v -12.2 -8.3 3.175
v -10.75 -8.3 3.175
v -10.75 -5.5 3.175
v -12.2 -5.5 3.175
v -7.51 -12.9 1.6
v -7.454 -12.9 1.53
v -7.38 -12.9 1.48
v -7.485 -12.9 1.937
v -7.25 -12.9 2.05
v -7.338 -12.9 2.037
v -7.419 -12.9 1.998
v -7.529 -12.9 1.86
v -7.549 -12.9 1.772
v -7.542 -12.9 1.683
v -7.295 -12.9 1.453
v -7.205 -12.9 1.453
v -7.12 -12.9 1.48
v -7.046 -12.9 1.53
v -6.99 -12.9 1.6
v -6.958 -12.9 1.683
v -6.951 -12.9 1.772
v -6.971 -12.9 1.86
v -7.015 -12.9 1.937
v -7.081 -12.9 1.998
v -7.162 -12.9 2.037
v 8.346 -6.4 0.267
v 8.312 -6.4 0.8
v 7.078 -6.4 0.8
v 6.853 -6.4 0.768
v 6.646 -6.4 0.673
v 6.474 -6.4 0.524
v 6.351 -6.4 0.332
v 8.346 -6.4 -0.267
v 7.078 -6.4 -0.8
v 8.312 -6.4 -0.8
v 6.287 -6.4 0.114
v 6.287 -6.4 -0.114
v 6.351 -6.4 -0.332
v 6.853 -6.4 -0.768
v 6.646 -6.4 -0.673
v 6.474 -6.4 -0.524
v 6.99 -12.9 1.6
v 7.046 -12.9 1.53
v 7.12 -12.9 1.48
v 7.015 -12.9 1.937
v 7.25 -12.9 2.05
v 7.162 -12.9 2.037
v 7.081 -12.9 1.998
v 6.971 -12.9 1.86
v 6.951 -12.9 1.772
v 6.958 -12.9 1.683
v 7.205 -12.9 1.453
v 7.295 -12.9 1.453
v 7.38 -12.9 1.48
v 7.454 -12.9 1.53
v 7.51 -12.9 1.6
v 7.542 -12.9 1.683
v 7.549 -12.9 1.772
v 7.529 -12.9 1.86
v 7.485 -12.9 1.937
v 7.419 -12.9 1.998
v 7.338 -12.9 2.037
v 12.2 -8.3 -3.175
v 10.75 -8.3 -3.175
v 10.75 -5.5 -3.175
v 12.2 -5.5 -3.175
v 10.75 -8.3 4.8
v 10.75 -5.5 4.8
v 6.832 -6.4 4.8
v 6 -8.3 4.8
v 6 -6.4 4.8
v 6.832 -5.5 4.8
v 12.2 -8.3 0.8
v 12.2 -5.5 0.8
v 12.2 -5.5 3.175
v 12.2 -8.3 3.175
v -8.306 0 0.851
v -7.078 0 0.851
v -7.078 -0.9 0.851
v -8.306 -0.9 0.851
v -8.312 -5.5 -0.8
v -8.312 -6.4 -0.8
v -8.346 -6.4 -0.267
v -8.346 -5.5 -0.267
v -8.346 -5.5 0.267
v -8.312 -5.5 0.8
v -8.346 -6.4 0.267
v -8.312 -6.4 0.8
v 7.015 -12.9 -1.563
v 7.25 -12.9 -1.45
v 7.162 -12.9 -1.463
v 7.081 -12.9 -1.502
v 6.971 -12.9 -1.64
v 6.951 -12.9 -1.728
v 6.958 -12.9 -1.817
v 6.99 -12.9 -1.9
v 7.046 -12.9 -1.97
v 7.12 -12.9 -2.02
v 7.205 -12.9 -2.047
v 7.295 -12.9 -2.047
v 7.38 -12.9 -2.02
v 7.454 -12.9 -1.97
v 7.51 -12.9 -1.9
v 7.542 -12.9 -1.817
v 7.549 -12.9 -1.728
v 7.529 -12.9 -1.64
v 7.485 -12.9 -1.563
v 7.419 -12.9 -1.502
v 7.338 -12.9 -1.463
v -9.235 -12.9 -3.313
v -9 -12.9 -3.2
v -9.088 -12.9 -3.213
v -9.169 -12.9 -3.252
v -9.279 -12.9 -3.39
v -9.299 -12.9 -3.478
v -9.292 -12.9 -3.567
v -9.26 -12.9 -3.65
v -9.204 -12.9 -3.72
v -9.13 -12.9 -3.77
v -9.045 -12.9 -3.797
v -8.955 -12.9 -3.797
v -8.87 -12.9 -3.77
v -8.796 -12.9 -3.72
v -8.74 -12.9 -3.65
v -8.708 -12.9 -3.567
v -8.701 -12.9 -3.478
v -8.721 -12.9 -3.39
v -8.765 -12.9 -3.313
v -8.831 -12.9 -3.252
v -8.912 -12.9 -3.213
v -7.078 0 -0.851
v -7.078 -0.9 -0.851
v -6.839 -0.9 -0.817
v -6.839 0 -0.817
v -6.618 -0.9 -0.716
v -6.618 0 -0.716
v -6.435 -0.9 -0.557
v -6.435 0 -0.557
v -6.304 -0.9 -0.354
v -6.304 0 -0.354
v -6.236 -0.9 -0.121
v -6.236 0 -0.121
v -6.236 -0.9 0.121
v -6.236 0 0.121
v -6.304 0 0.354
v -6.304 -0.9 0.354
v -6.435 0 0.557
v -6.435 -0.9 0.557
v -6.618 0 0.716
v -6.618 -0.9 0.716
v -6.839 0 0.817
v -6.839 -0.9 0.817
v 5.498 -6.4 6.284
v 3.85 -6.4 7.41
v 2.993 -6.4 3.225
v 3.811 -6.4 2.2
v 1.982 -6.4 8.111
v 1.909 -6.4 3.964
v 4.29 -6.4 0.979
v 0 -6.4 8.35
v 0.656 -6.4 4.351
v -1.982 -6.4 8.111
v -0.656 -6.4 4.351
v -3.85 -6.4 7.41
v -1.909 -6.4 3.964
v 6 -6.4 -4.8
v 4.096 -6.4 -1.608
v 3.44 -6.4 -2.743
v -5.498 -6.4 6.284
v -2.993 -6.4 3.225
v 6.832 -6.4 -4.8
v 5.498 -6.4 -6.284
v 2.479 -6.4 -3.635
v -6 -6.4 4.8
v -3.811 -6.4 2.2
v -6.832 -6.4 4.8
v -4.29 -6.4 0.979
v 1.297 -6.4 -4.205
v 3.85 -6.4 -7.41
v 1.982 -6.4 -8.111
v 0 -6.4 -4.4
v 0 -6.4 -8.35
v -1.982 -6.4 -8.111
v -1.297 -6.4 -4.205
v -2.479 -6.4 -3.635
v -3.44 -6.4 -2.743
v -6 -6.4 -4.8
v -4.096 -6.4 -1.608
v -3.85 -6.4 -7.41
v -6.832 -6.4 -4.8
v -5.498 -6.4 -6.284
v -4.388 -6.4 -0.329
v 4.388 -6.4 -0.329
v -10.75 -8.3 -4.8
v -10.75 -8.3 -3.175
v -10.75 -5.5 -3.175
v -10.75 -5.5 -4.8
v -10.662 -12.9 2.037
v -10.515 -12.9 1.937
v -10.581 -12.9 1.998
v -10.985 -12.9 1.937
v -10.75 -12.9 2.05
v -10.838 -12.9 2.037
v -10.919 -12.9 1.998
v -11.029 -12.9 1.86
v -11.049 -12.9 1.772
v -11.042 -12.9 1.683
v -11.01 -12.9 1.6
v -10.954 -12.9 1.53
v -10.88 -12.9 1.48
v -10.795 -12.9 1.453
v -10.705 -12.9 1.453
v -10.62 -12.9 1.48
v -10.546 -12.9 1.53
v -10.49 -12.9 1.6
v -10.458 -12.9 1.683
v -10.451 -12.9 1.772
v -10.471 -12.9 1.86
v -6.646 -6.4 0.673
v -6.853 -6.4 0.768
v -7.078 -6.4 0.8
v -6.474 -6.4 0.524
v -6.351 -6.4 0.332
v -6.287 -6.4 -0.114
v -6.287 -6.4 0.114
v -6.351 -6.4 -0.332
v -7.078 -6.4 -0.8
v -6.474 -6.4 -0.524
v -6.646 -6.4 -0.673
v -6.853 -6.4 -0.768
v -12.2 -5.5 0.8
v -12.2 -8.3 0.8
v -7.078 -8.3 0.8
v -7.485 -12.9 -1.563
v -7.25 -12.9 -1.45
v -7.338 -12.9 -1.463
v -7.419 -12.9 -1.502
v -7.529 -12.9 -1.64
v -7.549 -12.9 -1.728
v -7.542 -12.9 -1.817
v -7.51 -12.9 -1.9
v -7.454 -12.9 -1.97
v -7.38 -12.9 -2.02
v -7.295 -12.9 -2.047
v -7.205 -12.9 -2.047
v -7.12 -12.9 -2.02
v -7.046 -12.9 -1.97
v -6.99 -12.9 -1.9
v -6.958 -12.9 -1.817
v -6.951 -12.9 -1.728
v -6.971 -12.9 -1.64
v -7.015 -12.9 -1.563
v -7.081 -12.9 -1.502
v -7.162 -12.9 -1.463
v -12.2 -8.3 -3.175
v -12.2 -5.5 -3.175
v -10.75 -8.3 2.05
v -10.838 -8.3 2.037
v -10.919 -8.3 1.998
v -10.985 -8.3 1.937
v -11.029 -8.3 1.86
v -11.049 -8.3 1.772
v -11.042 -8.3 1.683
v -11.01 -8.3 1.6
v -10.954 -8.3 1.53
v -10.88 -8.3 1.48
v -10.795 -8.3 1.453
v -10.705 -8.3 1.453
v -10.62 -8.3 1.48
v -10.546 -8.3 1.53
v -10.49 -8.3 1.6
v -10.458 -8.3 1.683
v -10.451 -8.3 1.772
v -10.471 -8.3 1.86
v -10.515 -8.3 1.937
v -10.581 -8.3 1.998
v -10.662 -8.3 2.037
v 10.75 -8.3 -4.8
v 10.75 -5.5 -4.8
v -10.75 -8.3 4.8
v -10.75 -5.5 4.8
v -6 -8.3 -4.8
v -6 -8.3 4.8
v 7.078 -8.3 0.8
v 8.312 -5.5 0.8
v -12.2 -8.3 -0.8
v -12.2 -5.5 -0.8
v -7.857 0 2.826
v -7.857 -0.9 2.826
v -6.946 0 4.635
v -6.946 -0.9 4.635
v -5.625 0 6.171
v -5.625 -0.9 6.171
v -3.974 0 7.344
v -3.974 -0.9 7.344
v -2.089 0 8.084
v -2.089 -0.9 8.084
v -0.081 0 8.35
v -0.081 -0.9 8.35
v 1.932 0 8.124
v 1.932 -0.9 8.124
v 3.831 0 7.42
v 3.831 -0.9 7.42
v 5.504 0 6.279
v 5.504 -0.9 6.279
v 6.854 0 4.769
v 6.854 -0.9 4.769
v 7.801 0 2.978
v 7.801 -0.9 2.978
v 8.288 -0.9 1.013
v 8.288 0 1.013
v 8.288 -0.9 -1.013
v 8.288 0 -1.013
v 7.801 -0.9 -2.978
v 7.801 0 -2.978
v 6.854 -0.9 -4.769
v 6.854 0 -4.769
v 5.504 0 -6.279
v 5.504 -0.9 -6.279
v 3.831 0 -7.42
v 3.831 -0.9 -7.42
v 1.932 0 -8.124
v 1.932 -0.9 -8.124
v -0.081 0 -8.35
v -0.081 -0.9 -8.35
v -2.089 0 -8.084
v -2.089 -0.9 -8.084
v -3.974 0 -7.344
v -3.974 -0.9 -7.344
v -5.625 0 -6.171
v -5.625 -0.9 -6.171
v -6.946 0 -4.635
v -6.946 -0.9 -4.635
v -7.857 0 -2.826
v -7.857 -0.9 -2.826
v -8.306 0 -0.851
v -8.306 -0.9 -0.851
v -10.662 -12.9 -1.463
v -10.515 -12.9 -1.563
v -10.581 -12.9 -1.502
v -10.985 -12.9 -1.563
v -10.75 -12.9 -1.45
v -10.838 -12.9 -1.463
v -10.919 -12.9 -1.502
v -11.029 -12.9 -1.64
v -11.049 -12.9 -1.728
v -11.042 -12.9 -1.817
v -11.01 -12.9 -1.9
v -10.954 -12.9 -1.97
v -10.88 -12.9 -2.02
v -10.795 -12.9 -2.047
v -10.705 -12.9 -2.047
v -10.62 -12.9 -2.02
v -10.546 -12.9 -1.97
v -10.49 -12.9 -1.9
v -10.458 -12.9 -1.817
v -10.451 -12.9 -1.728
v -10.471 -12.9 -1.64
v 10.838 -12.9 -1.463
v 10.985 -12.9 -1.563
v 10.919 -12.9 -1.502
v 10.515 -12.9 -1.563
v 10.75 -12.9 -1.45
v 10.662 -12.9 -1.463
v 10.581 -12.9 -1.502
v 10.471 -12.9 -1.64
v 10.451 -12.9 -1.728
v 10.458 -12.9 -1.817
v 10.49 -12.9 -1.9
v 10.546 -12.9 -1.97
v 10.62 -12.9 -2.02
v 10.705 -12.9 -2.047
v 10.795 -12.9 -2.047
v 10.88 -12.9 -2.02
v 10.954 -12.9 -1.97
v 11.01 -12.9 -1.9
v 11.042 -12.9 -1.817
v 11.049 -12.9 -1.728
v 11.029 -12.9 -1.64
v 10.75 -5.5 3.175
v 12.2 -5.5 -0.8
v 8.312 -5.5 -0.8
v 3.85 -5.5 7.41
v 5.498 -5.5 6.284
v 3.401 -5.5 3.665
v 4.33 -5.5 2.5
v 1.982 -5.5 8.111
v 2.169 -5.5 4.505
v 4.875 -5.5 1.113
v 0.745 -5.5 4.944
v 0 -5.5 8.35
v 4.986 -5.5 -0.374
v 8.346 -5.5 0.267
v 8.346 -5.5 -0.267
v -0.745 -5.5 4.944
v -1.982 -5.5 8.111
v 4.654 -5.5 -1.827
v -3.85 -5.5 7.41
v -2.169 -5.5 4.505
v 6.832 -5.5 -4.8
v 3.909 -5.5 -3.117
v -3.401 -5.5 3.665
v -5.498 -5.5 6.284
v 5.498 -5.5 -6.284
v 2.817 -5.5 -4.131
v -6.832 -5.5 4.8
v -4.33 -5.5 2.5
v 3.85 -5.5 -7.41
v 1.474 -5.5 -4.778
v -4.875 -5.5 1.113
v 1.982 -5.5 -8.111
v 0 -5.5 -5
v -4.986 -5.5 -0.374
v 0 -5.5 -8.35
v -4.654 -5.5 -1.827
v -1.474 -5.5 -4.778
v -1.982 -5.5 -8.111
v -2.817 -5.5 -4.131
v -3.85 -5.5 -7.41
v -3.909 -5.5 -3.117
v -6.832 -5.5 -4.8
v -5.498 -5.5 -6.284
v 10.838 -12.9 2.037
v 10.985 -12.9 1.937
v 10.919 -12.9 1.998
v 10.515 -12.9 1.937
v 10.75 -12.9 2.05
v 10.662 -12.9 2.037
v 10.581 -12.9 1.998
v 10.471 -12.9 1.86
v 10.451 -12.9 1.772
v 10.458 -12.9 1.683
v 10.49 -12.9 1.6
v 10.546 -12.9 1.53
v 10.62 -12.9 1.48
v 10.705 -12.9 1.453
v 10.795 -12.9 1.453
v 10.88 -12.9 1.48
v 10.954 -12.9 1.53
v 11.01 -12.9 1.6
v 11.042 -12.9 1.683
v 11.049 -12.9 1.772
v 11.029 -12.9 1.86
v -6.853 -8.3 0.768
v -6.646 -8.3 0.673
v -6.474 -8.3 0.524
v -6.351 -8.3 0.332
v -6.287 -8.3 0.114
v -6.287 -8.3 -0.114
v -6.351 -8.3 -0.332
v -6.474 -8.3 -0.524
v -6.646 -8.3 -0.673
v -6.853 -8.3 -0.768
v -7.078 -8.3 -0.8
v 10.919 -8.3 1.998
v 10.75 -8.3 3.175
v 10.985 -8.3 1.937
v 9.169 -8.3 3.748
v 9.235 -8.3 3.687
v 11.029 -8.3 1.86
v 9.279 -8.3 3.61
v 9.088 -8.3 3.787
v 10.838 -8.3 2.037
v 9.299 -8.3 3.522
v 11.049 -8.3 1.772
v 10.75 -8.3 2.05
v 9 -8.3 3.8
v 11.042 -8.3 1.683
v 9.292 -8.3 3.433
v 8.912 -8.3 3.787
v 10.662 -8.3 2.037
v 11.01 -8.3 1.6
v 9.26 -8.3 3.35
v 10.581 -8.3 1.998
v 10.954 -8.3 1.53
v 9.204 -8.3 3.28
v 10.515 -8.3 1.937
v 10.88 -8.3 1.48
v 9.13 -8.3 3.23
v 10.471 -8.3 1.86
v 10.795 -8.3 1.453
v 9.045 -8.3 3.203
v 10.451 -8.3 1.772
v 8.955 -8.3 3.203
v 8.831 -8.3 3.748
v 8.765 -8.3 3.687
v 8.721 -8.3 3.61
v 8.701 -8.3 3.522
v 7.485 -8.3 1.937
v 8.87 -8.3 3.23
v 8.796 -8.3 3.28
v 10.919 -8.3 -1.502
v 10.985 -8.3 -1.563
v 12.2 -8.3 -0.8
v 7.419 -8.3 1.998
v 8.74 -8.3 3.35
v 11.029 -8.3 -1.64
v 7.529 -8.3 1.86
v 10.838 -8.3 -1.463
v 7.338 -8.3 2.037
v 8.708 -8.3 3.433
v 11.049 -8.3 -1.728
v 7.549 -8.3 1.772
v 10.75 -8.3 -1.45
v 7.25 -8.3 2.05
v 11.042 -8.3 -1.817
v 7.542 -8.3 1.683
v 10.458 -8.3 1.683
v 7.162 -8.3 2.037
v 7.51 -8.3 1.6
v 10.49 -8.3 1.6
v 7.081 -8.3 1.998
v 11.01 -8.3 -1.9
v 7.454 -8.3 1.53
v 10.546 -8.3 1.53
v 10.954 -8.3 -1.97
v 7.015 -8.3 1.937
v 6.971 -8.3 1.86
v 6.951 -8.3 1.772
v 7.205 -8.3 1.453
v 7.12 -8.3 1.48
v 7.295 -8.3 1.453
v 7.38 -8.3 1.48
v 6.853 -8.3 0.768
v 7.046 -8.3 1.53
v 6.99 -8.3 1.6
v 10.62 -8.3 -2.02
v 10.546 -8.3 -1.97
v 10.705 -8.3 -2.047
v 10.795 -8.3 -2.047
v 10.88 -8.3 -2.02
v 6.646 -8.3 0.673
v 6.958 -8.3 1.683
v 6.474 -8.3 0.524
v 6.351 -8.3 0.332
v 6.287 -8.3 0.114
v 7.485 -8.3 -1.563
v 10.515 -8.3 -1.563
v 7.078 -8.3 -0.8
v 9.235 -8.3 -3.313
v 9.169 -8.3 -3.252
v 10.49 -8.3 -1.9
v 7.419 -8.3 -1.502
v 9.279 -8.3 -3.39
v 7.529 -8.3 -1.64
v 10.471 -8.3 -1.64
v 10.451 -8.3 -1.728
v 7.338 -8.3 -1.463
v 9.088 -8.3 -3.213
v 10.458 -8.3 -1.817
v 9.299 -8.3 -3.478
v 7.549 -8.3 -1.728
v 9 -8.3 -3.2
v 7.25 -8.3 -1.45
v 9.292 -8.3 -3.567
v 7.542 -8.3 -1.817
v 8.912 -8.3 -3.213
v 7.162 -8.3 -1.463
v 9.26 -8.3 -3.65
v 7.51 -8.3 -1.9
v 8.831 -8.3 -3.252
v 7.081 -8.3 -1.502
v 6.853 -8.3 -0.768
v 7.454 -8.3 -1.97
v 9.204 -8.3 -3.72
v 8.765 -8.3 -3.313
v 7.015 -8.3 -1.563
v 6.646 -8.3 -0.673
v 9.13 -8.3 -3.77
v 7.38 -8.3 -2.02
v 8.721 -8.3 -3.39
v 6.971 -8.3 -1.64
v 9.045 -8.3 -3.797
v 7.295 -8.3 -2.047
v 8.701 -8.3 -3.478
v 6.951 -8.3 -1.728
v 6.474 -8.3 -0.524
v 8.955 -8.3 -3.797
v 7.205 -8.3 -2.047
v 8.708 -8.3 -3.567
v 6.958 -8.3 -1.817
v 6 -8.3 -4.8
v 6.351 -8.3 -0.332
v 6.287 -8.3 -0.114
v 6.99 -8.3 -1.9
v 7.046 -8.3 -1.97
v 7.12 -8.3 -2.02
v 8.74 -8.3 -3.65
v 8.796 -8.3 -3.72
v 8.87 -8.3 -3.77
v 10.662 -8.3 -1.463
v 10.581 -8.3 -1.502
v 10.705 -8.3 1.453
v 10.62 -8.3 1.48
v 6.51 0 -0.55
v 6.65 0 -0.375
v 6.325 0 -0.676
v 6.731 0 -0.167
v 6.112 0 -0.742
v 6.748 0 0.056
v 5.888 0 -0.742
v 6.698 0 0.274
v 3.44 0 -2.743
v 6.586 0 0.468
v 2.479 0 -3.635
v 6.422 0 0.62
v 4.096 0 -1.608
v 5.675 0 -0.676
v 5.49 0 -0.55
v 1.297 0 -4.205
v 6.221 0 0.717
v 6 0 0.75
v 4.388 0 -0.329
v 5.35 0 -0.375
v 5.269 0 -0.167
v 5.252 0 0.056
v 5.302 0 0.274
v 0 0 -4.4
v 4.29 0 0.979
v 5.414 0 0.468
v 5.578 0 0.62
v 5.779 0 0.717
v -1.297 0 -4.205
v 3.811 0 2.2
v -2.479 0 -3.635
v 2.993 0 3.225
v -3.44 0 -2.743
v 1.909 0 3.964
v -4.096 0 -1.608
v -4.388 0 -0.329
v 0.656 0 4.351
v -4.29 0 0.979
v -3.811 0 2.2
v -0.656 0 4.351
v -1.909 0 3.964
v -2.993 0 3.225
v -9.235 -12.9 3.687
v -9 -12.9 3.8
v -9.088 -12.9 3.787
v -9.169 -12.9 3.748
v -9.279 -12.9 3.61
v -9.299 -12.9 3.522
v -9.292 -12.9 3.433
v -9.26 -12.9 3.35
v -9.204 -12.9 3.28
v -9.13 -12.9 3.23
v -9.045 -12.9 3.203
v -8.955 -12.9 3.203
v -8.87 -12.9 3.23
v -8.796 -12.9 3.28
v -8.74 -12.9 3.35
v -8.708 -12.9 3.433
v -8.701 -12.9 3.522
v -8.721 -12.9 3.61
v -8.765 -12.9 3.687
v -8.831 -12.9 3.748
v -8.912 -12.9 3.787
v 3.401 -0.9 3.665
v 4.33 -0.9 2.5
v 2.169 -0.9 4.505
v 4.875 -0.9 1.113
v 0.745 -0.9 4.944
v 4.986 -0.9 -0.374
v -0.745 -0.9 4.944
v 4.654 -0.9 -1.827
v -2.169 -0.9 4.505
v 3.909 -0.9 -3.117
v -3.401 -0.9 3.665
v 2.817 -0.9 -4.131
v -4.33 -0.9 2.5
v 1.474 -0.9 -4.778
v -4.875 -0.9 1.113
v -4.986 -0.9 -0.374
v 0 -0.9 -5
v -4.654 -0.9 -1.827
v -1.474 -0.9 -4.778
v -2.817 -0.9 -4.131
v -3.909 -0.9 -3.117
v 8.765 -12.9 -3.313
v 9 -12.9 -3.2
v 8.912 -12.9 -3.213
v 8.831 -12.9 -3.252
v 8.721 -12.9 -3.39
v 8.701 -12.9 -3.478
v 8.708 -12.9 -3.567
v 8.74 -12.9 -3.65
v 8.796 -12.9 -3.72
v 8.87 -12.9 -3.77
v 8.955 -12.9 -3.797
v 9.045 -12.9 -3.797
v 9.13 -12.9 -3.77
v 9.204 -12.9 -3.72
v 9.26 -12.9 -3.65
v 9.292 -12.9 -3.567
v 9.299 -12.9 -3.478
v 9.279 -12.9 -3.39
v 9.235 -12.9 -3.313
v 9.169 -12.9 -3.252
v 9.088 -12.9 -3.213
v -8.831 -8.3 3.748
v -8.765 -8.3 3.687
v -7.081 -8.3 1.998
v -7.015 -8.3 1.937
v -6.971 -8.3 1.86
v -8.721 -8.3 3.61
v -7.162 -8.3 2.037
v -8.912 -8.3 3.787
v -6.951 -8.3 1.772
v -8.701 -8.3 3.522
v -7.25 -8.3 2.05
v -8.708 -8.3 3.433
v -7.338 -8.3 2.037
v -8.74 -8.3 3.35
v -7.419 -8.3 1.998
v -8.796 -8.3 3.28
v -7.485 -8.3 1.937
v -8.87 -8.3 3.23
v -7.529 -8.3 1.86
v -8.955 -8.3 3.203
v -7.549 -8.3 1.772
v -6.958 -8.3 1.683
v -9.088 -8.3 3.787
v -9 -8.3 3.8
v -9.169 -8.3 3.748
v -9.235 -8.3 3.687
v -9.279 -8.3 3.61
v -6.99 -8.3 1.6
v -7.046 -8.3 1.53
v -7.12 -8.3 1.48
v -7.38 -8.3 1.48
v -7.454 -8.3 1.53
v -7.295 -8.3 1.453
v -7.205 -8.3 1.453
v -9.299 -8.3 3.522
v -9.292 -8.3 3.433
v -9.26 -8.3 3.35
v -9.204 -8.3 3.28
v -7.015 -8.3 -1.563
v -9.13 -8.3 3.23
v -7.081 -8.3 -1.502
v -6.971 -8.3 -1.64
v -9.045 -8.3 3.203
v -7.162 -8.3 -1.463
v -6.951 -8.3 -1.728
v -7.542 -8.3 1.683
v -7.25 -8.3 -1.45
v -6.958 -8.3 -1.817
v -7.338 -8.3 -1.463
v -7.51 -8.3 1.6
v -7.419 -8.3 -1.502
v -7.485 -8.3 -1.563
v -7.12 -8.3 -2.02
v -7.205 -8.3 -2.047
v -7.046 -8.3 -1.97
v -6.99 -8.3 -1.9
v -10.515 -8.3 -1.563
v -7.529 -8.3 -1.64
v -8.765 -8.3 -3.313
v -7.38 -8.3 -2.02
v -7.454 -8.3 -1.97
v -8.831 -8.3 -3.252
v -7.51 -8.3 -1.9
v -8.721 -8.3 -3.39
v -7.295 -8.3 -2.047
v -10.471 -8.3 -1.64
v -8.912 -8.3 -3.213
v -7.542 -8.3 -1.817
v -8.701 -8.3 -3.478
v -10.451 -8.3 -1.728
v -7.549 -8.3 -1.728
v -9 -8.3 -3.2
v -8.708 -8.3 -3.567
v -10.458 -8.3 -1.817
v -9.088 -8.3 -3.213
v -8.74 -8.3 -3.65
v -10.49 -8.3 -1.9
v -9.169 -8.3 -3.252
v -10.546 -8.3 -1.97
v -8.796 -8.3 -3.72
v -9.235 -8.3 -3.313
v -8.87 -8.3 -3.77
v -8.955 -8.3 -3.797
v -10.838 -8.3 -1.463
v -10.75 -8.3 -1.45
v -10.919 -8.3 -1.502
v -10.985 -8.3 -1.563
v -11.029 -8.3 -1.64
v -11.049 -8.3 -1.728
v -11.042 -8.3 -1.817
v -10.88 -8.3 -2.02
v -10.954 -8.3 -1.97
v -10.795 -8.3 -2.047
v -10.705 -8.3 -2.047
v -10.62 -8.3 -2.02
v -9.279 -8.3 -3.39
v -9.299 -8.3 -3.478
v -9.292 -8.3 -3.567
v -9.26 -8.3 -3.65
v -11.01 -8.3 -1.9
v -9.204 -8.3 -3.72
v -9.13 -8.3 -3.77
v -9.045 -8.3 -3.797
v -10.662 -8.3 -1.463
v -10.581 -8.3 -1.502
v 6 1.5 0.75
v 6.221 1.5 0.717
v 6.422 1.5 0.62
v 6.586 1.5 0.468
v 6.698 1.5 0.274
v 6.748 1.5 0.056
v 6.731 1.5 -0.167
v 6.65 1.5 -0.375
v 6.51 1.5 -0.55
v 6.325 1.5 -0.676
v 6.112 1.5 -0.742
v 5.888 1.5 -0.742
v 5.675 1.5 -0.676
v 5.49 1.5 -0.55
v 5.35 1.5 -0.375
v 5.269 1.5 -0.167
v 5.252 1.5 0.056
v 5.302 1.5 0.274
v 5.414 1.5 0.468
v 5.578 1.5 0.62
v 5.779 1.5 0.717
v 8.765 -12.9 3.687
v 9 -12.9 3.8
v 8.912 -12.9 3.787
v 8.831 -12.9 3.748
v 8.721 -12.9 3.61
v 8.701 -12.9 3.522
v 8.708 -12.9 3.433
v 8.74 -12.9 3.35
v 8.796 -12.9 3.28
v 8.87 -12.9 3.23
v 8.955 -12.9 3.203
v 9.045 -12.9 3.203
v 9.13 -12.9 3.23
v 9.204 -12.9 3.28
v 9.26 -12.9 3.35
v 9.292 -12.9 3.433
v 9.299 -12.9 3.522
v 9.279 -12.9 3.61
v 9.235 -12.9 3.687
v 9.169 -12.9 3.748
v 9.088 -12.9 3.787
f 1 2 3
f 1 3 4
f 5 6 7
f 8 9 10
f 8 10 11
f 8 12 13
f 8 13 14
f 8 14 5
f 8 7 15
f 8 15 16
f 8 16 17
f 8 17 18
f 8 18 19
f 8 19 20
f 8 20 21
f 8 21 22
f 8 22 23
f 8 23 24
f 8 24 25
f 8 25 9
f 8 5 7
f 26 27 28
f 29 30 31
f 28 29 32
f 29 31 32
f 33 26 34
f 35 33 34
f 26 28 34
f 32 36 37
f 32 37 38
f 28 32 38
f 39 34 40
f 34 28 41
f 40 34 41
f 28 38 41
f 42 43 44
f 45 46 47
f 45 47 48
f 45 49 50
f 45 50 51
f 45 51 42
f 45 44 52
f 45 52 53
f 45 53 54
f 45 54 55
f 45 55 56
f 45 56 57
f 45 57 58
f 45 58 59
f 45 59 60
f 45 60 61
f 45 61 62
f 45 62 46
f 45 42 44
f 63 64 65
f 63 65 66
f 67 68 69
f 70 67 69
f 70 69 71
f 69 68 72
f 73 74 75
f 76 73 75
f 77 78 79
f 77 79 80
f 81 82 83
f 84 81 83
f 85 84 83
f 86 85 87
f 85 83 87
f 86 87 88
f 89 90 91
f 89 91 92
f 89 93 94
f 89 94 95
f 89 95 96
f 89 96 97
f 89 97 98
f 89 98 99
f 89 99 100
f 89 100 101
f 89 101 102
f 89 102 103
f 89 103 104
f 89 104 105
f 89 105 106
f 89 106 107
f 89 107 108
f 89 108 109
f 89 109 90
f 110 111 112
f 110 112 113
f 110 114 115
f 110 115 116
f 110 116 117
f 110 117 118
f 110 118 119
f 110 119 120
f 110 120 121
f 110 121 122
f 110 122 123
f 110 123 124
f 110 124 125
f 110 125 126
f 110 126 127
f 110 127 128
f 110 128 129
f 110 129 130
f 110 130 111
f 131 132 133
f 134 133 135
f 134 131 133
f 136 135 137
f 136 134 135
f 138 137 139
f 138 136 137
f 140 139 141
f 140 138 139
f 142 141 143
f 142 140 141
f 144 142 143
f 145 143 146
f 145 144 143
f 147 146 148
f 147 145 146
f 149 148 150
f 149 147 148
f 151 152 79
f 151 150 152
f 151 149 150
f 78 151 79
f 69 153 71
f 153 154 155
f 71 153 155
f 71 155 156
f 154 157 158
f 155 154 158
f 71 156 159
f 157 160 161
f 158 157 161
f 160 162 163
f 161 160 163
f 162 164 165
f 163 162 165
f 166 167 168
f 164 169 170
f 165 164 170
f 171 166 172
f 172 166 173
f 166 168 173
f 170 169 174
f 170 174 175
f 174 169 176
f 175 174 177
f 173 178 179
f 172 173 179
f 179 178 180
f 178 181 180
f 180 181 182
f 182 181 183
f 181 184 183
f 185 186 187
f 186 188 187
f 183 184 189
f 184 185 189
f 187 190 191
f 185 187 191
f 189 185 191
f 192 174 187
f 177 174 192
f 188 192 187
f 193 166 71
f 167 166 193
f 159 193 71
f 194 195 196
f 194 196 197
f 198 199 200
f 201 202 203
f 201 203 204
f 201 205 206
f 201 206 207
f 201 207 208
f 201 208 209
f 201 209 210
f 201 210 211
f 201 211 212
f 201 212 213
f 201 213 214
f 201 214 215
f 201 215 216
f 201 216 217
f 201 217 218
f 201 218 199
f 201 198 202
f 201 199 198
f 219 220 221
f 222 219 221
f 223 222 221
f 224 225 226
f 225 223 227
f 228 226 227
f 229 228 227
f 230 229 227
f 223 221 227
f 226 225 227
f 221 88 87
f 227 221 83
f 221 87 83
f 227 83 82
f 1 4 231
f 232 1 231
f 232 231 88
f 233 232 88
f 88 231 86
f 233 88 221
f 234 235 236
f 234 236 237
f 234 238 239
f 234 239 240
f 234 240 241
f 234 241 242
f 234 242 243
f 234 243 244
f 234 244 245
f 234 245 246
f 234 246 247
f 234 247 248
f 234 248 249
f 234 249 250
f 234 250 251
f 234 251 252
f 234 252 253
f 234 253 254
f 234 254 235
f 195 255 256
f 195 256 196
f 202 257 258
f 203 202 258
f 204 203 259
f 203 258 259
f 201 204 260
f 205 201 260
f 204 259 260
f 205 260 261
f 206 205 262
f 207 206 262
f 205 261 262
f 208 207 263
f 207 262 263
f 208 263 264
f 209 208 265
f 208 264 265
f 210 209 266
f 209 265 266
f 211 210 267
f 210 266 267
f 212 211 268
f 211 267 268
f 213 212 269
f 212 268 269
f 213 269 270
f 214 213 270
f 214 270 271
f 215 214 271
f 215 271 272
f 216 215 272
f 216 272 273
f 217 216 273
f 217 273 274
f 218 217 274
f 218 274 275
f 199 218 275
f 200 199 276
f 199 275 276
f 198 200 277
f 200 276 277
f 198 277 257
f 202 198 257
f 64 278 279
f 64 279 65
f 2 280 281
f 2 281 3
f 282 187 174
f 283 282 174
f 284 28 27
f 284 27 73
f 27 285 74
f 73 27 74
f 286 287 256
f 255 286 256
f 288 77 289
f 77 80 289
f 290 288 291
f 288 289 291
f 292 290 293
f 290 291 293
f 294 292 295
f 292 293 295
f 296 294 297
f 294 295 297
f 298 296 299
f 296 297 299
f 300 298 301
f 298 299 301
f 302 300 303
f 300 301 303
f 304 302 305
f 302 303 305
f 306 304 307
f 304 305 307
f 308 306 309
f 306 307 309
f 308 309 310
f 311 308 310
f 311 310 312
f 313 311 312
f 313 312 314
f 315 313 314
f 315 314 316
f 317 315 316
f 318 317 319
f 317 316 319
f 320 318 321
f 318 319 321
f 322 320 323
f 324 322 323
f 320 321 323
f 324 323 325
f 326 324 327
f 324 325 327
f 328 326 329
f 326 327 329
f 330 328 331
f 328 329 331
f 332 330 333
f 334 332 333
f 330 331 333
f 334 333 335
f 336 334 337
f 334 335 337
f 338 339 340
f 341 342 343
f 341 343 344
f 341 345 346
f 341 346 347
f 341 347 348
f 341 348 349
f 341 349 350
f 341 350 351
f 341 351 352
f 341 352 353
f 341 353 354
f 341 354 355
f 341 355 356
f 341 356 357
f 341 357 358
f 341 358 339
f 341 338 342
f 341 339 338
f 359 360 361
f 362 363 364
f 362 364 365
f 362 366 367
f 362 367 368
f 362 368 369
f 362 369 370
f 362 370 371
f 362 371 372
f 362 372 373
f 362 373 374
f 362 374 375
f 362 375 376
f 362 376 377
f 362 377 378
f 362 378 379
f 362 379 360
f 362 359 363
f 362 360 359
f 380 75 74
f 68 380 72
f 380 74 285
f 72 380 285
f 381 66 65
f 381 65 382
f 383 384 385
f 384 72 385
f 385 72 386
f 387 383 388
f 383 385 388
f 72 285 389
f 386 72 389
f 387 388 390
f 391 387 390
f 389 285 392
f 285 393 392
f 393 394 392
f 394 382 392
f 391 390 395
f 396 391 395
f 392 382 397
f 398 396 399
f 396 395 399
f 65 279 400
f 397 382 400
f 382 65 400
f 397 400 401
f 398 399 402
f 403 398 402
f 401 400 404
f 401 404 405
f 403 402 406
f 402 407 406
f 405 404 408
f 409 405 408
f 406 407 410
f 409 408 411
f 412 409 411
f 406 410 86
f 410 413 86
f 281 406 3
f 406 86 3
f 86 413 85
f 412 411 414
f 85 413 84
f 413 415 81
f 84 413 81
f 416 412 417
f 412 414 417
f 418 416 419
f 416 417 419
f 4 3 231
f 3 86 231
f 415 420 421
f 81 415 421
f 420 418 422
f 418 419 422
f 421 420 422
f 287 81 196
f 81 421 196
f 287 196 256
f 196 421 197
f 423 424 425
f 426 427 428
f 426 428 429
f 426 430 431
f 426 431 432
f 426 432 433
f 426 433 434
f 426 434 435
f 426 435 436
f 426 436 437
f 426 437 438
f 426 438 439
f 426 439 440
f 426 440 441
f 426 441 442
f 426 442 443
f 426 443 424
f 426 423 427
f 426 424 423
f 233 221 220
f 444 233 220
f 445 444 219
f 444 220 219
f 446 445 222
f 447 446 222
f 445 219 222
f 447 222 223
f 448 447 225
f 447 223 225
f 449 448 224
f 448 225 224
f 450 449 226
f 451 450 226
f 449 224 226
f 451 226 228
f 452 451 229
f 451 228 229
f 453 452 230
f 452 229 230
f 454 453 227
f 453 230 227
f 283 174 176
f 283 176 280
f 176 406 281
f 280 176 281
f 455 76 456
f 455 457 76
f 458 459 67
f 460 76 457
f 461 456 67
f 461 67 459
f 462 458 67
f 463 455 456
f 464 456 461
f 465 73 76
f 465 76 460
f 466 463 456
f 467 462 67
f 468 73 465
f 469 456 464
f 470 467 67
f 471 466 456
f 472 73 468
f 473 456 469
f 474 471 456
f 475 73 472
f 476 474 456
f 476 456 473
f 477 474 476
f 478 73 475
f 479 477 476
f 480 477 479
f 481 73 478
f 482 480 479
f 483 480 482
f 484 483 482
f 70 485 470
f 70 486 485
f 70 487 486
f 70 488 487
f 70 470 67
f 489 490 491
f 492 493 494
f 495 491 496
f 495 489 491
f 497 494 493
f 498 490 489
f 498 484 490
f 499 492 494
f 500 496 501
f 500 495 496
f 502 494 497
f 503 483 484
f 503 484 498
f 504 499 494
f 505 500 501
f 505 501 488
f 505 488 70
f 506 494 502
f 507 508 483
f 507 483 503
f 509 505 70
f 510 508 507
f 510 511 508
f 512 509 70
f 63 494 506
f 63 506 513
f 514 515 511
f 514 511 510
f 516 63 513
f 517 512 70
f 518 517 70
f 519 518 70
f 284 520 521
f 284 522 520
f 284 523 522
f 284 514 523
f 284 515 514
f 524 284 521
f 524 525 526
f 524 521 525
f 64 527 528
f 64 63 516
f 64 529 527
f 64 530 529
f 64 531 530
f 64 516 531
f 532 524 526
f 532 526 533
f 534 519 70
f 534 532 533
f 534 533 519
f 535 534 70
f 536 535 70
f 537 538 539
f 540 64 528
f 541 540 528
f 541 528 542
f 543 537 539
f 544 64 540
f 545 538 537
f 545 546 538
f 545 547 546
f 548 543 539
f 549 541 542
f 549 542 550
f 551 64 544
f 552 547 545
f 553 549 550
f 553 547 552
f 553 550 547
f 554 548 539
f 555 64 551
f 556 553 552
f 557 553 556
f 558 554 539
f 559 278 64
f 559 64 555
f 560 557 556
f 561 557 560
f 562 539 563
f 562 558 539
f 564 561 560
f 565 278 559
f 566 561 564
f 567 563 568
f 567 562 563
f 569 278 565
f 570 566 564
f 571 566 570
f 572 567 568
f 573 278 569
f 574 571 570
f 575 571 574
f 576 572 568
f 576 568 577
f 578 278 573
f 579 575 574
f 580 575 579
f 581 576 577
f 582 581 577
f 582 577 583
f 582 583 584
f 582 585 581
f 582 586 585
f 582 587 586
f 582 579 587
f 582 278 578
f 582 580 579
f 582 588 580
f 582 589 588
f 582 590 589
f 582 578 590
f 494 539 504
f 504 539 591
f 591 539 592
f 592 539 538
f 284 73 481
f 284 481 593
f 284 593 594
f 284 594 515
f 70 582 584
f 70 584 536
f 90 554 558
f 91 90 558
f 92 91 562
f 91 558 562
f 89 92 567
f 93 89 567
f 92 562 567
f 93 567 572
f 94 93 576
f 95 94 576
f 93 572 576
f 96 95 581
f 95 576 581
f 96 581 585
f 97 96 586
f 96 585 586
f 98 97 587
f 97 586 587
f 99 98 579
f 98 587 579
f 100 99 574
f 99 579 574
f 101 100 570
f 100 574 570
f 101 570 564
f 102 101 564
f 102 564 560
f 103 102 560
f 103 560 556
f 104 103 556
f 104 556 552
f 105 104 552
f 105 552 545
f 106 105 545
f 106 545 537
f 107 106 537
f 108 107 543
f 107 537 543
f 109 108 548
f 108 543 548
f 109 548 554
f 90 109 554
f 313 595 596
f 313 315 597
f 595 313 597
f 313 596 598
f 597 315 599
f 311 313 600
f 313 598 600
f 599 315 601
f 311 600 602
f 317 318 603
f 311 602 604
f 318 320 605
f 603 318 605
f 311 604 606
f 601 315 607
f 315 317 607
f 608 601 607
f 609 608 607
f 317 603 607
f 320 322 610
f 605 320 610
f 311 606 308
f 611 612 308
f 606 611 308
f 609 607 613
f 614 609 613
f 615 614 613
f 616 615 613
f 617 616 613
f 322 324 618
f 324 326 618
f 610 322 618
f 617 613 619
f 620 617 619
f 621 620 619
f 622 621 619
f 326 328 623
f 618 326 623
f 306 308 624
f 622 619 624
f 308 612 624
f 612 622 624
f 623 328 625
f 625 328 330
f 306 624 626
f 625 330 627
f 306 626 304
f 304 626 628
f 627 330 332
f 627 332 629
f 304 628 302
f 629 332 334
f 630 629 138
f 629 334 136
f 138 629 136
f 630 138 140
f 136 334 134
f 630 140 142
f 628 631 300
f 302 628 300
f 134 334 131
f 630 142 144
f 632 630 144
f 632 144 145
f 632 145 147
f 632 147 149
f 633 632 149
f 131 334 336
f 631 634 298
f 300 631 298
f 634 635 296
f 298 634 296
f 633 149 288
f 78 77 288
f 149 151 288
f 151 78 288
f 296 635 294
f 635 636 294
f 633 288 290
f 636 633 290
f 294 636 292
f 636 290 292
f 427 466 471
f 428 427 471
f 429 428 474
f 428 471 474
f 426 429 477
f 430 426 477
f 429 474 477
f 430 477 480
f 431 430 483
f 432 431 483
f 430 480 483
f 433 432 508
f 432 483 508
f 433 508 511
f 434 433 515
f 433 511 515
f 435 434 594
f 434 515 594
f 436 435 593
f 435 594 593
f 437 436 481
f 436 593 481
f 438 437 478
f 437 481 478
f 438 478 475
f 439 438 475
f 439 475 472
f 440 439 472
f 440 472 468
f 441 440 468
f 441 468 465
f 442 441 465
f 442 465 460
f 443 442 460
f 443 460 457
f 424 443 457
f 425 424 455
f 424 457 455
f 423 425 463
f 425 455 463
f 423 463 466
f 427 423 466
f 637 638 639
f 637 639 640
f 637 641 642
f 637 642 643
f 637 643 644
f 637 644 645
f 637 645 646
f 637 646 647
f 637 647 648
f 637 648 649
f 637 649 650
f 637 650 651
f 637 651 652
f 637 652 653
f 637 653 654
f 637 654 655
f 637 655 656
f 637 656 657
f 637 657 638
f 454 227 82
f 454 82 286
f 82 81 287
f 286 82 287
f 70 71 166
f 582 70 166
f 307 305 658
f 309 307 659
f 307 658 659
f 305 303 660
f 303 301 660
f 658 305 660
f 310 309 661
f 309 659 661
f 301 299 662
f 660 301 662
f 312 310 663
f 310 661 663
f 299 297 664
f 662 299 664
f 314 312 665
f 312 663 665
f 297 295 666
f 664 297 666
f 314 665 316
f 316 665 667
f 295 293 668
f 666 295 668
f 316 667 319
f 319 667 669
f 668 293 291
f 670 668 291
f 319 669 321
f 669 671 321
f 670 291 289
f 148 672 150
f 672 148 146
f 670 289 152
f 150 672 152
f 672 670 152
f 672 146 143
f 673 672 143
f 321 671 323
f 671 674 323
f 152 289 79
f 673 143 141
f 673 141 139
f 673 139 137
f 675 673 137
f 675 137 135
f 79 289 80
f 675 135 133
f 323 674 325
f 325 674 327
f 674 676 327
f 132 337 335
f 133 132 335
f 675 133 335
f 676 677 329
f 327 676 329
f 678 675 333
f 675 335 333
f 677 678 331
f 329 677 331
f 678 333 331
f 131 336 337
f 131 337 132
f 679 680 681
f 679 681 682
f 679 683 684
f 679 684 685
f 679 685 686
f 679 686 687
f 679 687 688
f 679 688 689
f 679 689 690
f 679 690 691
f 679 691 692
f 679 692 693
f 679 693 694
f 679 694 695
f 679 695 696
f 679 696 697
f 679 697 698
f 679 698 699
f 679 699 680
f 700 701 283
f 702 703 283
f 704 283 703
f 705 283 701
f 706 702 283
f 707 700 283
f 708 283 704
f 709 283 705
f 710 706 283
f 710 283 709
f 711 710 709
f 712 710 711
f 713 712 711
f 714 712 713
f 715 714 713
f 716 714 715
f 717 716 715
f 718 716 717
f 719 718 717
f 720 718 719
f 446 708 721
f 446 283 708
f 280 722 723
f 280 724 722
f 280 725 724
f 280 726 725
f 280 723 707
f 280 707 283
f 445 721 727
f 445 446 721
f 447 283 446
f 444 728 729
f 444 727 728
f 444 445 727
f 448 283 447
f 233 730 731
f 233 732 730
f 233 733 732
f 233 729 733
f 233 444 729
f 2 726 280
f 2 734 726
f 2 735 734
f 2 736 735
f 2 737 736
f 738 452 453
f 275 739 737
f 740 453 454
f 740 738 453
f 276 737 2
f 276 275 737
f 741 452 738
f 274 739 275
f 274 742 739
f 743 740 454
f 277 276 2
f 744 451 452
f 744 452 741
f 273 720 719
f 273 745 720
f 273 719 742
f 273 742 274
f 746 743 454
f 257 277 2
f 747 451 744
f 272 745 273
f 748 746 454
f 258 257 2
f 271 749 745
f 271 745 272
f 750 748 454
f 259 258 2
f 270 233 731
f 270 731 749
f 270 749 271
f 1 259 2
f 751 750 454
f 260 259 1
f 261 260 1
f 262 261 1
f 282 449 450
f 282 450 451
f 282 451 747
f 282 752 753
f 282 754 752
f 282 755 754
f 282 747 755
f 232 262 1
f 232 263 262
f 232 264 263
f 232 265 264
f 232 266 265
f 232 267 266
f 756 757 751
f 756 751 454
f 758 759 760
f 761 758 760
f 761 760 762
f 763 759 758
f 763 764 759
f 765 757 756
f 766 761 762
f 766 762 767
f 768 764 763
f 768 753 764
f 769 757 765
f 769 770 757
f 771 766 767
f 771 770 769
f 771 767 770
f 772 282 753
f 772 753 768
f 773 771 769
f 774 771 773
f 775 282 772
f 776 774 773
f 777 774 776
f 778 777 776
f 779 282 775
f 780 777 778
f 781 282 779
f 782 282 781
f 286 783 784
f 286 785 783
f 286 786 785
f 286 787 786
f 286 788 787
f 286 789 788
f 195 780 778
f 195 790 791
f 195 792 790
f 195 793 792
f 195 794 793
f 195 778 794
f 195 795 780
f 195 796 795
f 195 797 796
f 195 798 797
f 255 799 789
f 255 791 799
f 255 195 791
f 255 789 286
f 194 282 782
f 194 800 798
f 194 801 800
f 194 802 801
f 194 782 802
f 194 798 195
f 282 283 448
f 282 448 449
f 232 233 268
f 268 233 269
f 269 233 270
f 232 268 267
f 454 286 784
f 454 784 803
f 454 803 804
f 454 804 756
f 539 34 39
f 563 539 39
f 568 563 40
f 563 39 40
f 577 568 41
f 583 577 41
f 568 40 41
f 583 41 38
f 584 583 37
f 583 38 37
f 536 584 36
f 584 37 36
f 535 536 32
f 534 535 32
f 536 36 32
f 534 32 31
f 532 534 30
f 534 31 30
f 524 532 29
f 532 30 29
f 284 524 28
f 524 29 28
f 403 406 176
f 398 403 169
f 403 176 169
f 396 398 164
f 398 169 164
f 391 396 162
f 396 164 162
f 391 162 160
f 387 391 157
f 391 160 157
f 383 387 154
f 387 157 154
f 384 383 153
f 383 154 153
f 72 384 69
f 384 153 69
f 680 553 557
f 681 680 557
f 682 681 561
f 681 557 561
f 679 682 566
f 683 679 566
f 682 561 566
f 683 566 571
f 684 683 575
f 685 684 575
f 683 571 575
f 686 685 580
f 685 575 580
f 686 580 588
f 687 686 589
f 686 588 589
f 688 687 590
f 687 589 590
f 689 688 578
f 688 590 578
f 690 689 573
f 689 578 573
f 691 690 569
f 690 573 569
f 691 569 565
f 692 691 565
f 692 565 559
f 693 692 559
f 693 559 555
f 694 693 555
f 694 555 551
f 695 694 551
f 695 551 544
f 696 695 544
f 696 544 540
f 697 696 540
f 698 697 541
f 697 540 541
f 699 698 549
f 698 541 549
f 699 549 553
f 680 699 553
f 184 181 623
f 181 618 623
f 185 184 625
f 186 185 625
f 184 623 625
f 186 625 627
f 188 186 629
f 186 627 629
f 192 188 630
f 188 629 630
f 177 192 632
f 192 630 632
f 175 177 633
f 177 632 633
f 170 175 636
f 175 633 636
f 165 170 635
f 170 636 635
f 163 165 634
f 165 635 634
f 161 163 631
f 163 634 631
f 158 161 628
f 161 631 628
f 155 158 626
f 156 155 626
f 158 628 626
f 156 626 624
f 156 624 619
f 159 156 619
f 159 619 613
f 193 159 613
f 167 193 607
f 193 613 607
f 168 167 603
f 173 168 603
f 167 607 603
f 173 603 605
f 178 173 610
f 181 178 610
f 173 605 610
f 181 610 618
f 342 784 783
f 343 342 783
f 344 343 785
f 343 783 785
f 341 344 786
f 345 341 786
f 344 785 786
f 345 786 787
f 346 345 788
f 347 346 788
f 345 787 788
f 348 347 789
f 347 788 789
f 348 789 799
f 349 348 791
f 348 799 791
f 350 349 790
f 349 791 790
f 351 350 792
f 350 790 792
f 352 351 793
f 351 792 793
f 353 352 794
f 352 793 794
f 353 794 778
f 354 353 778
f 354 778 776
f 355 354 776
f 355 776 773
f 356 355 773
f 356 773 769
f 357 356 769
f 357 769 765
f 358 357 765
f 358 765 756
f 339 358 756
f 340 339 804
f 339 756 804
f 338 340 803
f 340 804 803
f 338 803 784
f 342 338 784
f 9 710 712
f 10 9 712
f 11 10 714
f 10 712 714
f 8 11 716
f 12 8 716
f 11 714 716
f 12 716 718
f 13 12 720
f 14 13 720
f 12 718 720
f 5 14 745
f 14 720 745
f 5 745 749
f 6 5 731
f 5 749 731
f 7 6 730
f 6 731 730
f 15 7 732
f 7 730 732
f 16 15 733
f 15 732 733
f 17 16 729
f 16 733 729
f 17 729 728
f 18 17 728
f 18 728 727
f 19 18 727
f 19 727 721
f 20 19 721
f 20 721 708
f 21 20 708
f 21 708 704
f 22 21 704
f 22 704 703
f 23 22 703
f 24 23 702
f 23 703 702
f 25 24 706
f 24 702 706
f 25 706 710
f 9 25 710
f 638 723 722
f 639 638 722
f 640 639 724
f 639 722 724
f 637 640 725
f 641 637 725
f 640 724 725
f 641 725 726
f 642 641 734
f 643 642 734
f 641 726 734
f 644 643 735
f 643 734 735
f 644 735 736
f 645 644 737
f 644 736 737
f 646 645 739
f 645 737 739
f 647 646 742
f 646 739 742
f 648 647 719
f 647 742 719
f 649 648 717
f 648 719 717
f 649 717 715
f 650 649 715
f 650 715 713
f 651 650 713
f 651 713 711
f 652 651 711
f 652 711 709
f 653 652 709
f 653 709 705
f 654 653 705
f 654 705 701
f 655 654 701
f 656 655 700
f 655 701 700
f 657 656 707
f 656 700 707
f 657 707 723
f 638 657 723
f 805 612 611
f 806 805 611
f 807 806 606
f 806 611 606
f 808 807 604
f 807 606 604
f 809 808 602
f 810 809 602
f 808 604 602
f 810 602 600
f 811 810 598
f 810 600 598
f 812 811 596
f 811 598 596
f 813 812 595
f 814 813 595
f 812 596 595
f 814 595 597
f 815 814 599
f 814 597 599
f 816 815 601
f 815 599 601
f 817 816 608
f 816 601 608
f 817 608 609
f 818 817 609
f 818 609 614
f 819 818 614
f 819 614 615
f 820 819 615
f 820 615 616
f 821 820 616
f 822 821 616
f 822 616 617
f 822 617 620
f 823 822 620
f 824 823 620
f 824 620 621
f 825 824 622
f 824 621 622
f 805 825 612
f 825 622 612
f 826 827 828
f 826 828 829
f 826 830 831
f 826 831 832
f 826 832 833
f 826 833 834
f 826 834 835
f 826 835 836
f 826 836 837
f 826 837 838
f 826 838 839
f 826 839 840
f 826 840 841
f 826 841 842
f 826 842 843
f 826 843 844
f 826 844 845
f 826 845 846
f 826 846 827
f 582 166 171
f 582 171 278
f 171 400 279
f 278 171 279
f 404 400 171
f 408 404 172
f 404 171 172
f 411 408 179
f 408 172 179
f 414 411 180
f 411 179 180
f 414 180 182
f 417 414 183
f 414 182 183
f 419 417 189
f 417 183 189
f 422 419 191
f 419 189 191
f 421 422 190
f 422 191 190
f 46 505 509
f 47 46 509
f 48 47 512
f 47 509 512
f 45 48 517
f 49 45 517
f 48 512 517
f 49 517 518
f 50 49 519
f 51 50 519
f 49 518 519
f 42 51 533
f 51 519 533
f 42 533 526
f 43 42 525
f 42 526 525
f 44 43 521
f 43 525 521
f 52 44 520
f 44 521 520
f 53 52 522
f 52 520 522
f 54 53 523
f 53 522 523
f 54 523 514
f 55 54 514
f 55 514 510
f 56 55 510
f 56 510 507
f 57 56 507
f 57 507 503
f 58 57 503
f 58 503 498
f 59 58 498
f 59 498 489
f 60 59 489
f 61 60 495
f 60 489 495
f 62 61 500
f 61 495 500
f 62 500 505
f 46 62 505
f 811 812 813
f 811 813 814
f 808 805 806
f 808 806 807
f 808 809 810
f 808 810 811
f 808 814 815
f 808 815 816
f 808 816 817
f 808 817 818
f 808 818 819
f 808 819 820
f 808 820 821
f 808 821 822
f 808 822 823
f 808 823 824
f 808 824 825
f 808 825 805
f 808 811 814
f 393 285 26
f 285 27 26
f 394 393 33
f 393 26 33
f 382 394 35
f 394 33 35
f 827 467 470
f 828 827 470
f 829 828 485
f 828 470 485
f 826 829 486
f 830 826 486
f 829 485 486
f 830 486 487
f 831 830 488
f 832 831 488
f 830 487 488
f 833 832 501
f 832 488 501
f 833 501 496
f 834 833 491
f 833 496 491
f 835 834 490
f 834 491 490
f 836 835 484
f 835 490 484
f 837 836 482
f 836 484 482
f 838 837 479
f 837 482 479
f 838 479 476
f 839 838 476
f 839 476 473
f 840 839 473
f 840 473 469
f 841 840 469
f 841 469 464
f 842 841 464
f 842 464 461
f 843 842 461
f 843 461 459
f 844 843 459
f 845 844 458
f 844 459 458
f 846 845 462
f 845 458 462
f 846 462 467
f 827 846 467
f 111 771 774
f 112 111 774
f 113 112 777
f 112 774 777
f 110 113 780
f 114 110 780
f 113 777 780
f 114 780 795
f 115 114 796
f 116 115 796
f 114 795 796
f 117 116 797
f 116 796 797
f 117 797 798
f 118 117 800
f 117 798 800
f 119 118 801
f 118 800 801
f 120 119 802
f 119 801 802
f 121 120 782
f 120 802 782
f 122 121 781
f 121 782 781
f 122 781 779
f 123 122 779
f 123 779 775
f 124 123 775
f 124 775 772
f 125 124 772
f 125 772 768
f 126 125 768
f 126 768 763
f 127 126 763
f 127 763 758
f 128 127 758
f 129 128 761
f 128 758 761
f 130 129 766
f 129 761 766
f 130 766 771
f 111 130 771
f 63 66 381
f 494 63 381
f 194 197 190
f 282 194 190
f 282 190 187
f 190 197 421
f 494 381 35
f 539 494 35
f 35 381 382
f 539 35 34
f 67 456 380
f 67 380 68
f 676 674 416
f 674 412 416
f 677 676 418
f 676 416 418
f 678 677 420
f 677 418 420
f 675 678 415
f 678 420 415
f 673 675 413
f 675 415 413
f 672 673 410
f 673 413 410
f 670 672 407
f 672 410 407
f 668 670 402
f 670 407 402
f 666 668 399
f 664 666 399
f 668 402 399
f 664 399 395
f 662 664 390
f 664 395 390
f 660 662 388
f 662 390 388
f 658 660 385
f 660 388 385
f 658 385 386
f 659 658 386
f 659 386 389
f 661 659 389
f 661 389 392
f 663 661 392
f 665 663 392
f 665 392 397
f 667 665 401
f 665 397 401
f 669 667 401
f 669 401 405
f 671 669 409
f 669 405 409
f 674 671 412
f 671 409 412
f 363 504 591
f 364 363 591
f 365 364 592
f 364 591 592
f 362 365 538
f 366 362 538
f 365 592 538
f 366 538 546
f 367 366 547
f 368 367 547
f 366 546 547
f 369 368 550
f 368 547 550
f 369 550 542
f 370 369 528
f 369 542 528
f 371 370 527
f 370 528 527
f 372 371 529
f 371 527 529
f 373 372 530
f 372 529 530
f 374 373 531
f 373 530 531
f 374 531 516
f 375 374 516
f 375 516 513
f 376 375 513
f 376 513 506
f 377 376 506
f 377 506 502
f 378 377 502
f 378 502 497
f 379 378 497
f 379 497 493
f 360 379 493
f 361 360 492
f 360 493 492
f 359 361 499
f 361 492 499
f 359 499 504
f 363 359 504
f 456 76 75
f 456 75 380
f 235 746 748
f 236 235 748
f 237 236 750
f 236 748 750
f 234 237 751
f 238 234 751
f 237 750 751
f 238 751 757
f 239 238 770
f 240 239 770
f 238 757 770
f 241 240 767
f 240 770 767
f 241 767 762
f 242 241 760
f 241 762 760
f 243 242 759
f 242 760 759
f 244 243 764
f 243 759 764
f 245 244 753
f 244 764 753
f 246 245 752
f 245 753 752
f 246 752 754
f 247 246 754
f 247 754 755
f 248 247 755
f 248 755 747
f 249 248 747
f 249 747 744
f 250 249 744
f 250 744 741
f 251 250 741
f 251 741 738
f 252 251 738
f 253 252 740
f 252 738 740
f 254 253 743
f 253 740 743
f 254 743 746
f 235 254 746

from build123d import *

# Parameters (mm, degrees)
SKETCH_2_R          = 0.75
EXTRUDE_1_DEPTH     = 1.5
CUT_EXTRUDE_1_DEPTH = 1.5
EXTRUDE_2_DEPTH     = 2.8
SKETCH_5_R          = 0.3
EXTRUDE_3_DEPTH     = 4.6


with BuildPart() as part:
    # 草图1 → 旋转1 (revolve)
    with BuildSketch(Plane.XY, mode=Mode.PRIVATE) as revolve_1_sk:
        Polygon((8.35, -5.5), (8.35, -6.4), (4.4, -6.4), (4.4, 0), (8.35, 0), (8.35, -0.9), (5, -0.9), (5, -5.5), align=None)
    revolve(revolve_1_sk.sketch.rotate(Axis((0, -3.284222298, 0), (0, 1, 0)), 90), axis=Axis((0, -3.284222298, 0), (0, 1, 0)))

    # 草图2 → 凸台-拉伸1 (add)
    with BuildSketch(Plane(origin=(0, 0, 0), x_dir=(1, 0, 0), z_dir=(0, 1, 0))):
        with Locations(Location((6, 0, 0), (0, 0, 270))):
            Circle(SKETCH_2_R)
    extrude(amount=EXTRUDE_1_DEPTH)

    # 草图3 → 切除-拉伸1 (cut)
    with BuildSketch(Plane(origin=(0, 0, 0), x_dir=(1, 0, 0), z_dir=(0, 1, 0))):
        with BuildLine():
            Line((-7.078375357, -0.851310072), (-10.983685898, -0.851310072))
            ThreePointArc((-10.983685898, -0.851310072), (-11.834995971, 0), (-10.983685898, 0.851310072))
            Line((-10.983685898, 0.851310072), (-7.078375357, 0.851310072))
            ThreePointArc((-7.078375357, 0.851310072), (-6.227065284, 0), (-7.078375357, -0.851310072))
        make_face()
    extrude(amount=-CUT_EXTRUDE_1_DEPTH, mode=Mode.SUBTRACT)

    # 草图4 → 凸台-拉伸2 (add)
    with BuildSketch(Plane(origin=(0, -5.5, 0), x_dir=(1, 0, 0), z_dir=(0, 1, 0))):
        with BuildLine():
            Line((-10.75, 4.8), (-6, 4.8))
            Line((-6, 4.8), (-6, -4.8))
            Line((-6, -4.8), (-10.75, -4.8))
            Line((-10.75, -4.8), (-10.75, -3.175))
            Line((-10.75, -3.175), (-12.2, -3.175))
            Line((-12.2, -3.175), (-12.2, -0.8))
            Line((-12.2, -0.8), (-7.078375357, -0.8))
            ThreePointArc((-7.078375357, -0.8), (-6.278375357, 0), (-7.078375357, 0.8))
            Line((-7.078375357, 0.8), (-12.2, 0.8))
            Line((-12.2, 0.8), (-12.2, 3.175))
            Line((-12.2, 3.175), (-10.75, 3.175))
            Line((-10.75, 3.175), (-10.75, 4.8))
        make_face()
        with BuildLine():
            Line((12.2, 3.175), (12.2, 0.8))
            Line((12.2, 0.8), (7.078375357, 0.8))
            ThreePointArc((7.078375357, 0.8), (6.278375357, 0), (7.078375357, -0.8))
            Line((7.078375357, -0.8), (12.2, -0.8))
            Line((12.2, -0.8), (12.2, -3.175))
            Line((12.2, -3.175), (10.75, -3.175))
            Line((10.75, -3.175), (10.75, -4.8))
            Line((10.75, -4.8), (6, -4.8))
            Line((6, -4.8), (6, 4.8))
            Line((6, 4.8), (10.75, 4.8))
            Line((10.75, 4.8), (10.75, 3.175))
            Line((10.75, 3.175), (12.2, 3.175))
        make_face()
    extrude(amount=-EXTRUDE_2_DEPTH)

    # 草图5 → 凸台-拉伸3 (add)
    with BuildSketch(Plane.XZ.offset(8.3)):
        with Locations(Location((-10.75, -1.75, 0), (0, 0, 90))):
            Circle(SKETCH_5_R)
        with Locations(Location((-7.25, -1.75, 0), (0, 0, 90))):
            Circle(SKETCH_5_R)
        with Locations(Location((-9, -3.5, 0), (0, 0, 90))):
            Circle(SKETCH_5_R)
        with Locations(Location((-9, 3.5, 0), (0, 0, 90))):
            Circle(SKETCH_5_R)
        with Locations(Location((-10.75, 1.75, 0), (0, 0, 90))):
            Circle(SKETCH_5_R)
        with Locations(Location((-7.25, 1.75, 0), (0, 0, 90))):
            Circle(SKETCH_5_R)
        with Locations(Location((7.25, 1.75, 0), (0, 0, 90))):
            Circle(SKETCH_5_R)
        with Locations(Location((10.75, 1.75, 0), (0, 0, 90))):
            Circle(SKETCH_5_R)
        with Locations(Location((10.75, -1.75, 0), (0, 0, 90))):
            Circle(SKETCH_5_R)
        with Locations(Location((7.25, -1.75, 0), (0, 0, 90))):
            Circle(SKETCH_5_R)
        with Locations(Location((9, -3.5, 0), (0, 0, 90))):
            Circle(SKETCH_5_R)
        with Locations(Location((9, 3.5, 0), (0, 0, 90))):
            Circle(SKETCH_5_R)
    extrude(amount=EXTRUDE_3_DEPTH)


solid = part.part
